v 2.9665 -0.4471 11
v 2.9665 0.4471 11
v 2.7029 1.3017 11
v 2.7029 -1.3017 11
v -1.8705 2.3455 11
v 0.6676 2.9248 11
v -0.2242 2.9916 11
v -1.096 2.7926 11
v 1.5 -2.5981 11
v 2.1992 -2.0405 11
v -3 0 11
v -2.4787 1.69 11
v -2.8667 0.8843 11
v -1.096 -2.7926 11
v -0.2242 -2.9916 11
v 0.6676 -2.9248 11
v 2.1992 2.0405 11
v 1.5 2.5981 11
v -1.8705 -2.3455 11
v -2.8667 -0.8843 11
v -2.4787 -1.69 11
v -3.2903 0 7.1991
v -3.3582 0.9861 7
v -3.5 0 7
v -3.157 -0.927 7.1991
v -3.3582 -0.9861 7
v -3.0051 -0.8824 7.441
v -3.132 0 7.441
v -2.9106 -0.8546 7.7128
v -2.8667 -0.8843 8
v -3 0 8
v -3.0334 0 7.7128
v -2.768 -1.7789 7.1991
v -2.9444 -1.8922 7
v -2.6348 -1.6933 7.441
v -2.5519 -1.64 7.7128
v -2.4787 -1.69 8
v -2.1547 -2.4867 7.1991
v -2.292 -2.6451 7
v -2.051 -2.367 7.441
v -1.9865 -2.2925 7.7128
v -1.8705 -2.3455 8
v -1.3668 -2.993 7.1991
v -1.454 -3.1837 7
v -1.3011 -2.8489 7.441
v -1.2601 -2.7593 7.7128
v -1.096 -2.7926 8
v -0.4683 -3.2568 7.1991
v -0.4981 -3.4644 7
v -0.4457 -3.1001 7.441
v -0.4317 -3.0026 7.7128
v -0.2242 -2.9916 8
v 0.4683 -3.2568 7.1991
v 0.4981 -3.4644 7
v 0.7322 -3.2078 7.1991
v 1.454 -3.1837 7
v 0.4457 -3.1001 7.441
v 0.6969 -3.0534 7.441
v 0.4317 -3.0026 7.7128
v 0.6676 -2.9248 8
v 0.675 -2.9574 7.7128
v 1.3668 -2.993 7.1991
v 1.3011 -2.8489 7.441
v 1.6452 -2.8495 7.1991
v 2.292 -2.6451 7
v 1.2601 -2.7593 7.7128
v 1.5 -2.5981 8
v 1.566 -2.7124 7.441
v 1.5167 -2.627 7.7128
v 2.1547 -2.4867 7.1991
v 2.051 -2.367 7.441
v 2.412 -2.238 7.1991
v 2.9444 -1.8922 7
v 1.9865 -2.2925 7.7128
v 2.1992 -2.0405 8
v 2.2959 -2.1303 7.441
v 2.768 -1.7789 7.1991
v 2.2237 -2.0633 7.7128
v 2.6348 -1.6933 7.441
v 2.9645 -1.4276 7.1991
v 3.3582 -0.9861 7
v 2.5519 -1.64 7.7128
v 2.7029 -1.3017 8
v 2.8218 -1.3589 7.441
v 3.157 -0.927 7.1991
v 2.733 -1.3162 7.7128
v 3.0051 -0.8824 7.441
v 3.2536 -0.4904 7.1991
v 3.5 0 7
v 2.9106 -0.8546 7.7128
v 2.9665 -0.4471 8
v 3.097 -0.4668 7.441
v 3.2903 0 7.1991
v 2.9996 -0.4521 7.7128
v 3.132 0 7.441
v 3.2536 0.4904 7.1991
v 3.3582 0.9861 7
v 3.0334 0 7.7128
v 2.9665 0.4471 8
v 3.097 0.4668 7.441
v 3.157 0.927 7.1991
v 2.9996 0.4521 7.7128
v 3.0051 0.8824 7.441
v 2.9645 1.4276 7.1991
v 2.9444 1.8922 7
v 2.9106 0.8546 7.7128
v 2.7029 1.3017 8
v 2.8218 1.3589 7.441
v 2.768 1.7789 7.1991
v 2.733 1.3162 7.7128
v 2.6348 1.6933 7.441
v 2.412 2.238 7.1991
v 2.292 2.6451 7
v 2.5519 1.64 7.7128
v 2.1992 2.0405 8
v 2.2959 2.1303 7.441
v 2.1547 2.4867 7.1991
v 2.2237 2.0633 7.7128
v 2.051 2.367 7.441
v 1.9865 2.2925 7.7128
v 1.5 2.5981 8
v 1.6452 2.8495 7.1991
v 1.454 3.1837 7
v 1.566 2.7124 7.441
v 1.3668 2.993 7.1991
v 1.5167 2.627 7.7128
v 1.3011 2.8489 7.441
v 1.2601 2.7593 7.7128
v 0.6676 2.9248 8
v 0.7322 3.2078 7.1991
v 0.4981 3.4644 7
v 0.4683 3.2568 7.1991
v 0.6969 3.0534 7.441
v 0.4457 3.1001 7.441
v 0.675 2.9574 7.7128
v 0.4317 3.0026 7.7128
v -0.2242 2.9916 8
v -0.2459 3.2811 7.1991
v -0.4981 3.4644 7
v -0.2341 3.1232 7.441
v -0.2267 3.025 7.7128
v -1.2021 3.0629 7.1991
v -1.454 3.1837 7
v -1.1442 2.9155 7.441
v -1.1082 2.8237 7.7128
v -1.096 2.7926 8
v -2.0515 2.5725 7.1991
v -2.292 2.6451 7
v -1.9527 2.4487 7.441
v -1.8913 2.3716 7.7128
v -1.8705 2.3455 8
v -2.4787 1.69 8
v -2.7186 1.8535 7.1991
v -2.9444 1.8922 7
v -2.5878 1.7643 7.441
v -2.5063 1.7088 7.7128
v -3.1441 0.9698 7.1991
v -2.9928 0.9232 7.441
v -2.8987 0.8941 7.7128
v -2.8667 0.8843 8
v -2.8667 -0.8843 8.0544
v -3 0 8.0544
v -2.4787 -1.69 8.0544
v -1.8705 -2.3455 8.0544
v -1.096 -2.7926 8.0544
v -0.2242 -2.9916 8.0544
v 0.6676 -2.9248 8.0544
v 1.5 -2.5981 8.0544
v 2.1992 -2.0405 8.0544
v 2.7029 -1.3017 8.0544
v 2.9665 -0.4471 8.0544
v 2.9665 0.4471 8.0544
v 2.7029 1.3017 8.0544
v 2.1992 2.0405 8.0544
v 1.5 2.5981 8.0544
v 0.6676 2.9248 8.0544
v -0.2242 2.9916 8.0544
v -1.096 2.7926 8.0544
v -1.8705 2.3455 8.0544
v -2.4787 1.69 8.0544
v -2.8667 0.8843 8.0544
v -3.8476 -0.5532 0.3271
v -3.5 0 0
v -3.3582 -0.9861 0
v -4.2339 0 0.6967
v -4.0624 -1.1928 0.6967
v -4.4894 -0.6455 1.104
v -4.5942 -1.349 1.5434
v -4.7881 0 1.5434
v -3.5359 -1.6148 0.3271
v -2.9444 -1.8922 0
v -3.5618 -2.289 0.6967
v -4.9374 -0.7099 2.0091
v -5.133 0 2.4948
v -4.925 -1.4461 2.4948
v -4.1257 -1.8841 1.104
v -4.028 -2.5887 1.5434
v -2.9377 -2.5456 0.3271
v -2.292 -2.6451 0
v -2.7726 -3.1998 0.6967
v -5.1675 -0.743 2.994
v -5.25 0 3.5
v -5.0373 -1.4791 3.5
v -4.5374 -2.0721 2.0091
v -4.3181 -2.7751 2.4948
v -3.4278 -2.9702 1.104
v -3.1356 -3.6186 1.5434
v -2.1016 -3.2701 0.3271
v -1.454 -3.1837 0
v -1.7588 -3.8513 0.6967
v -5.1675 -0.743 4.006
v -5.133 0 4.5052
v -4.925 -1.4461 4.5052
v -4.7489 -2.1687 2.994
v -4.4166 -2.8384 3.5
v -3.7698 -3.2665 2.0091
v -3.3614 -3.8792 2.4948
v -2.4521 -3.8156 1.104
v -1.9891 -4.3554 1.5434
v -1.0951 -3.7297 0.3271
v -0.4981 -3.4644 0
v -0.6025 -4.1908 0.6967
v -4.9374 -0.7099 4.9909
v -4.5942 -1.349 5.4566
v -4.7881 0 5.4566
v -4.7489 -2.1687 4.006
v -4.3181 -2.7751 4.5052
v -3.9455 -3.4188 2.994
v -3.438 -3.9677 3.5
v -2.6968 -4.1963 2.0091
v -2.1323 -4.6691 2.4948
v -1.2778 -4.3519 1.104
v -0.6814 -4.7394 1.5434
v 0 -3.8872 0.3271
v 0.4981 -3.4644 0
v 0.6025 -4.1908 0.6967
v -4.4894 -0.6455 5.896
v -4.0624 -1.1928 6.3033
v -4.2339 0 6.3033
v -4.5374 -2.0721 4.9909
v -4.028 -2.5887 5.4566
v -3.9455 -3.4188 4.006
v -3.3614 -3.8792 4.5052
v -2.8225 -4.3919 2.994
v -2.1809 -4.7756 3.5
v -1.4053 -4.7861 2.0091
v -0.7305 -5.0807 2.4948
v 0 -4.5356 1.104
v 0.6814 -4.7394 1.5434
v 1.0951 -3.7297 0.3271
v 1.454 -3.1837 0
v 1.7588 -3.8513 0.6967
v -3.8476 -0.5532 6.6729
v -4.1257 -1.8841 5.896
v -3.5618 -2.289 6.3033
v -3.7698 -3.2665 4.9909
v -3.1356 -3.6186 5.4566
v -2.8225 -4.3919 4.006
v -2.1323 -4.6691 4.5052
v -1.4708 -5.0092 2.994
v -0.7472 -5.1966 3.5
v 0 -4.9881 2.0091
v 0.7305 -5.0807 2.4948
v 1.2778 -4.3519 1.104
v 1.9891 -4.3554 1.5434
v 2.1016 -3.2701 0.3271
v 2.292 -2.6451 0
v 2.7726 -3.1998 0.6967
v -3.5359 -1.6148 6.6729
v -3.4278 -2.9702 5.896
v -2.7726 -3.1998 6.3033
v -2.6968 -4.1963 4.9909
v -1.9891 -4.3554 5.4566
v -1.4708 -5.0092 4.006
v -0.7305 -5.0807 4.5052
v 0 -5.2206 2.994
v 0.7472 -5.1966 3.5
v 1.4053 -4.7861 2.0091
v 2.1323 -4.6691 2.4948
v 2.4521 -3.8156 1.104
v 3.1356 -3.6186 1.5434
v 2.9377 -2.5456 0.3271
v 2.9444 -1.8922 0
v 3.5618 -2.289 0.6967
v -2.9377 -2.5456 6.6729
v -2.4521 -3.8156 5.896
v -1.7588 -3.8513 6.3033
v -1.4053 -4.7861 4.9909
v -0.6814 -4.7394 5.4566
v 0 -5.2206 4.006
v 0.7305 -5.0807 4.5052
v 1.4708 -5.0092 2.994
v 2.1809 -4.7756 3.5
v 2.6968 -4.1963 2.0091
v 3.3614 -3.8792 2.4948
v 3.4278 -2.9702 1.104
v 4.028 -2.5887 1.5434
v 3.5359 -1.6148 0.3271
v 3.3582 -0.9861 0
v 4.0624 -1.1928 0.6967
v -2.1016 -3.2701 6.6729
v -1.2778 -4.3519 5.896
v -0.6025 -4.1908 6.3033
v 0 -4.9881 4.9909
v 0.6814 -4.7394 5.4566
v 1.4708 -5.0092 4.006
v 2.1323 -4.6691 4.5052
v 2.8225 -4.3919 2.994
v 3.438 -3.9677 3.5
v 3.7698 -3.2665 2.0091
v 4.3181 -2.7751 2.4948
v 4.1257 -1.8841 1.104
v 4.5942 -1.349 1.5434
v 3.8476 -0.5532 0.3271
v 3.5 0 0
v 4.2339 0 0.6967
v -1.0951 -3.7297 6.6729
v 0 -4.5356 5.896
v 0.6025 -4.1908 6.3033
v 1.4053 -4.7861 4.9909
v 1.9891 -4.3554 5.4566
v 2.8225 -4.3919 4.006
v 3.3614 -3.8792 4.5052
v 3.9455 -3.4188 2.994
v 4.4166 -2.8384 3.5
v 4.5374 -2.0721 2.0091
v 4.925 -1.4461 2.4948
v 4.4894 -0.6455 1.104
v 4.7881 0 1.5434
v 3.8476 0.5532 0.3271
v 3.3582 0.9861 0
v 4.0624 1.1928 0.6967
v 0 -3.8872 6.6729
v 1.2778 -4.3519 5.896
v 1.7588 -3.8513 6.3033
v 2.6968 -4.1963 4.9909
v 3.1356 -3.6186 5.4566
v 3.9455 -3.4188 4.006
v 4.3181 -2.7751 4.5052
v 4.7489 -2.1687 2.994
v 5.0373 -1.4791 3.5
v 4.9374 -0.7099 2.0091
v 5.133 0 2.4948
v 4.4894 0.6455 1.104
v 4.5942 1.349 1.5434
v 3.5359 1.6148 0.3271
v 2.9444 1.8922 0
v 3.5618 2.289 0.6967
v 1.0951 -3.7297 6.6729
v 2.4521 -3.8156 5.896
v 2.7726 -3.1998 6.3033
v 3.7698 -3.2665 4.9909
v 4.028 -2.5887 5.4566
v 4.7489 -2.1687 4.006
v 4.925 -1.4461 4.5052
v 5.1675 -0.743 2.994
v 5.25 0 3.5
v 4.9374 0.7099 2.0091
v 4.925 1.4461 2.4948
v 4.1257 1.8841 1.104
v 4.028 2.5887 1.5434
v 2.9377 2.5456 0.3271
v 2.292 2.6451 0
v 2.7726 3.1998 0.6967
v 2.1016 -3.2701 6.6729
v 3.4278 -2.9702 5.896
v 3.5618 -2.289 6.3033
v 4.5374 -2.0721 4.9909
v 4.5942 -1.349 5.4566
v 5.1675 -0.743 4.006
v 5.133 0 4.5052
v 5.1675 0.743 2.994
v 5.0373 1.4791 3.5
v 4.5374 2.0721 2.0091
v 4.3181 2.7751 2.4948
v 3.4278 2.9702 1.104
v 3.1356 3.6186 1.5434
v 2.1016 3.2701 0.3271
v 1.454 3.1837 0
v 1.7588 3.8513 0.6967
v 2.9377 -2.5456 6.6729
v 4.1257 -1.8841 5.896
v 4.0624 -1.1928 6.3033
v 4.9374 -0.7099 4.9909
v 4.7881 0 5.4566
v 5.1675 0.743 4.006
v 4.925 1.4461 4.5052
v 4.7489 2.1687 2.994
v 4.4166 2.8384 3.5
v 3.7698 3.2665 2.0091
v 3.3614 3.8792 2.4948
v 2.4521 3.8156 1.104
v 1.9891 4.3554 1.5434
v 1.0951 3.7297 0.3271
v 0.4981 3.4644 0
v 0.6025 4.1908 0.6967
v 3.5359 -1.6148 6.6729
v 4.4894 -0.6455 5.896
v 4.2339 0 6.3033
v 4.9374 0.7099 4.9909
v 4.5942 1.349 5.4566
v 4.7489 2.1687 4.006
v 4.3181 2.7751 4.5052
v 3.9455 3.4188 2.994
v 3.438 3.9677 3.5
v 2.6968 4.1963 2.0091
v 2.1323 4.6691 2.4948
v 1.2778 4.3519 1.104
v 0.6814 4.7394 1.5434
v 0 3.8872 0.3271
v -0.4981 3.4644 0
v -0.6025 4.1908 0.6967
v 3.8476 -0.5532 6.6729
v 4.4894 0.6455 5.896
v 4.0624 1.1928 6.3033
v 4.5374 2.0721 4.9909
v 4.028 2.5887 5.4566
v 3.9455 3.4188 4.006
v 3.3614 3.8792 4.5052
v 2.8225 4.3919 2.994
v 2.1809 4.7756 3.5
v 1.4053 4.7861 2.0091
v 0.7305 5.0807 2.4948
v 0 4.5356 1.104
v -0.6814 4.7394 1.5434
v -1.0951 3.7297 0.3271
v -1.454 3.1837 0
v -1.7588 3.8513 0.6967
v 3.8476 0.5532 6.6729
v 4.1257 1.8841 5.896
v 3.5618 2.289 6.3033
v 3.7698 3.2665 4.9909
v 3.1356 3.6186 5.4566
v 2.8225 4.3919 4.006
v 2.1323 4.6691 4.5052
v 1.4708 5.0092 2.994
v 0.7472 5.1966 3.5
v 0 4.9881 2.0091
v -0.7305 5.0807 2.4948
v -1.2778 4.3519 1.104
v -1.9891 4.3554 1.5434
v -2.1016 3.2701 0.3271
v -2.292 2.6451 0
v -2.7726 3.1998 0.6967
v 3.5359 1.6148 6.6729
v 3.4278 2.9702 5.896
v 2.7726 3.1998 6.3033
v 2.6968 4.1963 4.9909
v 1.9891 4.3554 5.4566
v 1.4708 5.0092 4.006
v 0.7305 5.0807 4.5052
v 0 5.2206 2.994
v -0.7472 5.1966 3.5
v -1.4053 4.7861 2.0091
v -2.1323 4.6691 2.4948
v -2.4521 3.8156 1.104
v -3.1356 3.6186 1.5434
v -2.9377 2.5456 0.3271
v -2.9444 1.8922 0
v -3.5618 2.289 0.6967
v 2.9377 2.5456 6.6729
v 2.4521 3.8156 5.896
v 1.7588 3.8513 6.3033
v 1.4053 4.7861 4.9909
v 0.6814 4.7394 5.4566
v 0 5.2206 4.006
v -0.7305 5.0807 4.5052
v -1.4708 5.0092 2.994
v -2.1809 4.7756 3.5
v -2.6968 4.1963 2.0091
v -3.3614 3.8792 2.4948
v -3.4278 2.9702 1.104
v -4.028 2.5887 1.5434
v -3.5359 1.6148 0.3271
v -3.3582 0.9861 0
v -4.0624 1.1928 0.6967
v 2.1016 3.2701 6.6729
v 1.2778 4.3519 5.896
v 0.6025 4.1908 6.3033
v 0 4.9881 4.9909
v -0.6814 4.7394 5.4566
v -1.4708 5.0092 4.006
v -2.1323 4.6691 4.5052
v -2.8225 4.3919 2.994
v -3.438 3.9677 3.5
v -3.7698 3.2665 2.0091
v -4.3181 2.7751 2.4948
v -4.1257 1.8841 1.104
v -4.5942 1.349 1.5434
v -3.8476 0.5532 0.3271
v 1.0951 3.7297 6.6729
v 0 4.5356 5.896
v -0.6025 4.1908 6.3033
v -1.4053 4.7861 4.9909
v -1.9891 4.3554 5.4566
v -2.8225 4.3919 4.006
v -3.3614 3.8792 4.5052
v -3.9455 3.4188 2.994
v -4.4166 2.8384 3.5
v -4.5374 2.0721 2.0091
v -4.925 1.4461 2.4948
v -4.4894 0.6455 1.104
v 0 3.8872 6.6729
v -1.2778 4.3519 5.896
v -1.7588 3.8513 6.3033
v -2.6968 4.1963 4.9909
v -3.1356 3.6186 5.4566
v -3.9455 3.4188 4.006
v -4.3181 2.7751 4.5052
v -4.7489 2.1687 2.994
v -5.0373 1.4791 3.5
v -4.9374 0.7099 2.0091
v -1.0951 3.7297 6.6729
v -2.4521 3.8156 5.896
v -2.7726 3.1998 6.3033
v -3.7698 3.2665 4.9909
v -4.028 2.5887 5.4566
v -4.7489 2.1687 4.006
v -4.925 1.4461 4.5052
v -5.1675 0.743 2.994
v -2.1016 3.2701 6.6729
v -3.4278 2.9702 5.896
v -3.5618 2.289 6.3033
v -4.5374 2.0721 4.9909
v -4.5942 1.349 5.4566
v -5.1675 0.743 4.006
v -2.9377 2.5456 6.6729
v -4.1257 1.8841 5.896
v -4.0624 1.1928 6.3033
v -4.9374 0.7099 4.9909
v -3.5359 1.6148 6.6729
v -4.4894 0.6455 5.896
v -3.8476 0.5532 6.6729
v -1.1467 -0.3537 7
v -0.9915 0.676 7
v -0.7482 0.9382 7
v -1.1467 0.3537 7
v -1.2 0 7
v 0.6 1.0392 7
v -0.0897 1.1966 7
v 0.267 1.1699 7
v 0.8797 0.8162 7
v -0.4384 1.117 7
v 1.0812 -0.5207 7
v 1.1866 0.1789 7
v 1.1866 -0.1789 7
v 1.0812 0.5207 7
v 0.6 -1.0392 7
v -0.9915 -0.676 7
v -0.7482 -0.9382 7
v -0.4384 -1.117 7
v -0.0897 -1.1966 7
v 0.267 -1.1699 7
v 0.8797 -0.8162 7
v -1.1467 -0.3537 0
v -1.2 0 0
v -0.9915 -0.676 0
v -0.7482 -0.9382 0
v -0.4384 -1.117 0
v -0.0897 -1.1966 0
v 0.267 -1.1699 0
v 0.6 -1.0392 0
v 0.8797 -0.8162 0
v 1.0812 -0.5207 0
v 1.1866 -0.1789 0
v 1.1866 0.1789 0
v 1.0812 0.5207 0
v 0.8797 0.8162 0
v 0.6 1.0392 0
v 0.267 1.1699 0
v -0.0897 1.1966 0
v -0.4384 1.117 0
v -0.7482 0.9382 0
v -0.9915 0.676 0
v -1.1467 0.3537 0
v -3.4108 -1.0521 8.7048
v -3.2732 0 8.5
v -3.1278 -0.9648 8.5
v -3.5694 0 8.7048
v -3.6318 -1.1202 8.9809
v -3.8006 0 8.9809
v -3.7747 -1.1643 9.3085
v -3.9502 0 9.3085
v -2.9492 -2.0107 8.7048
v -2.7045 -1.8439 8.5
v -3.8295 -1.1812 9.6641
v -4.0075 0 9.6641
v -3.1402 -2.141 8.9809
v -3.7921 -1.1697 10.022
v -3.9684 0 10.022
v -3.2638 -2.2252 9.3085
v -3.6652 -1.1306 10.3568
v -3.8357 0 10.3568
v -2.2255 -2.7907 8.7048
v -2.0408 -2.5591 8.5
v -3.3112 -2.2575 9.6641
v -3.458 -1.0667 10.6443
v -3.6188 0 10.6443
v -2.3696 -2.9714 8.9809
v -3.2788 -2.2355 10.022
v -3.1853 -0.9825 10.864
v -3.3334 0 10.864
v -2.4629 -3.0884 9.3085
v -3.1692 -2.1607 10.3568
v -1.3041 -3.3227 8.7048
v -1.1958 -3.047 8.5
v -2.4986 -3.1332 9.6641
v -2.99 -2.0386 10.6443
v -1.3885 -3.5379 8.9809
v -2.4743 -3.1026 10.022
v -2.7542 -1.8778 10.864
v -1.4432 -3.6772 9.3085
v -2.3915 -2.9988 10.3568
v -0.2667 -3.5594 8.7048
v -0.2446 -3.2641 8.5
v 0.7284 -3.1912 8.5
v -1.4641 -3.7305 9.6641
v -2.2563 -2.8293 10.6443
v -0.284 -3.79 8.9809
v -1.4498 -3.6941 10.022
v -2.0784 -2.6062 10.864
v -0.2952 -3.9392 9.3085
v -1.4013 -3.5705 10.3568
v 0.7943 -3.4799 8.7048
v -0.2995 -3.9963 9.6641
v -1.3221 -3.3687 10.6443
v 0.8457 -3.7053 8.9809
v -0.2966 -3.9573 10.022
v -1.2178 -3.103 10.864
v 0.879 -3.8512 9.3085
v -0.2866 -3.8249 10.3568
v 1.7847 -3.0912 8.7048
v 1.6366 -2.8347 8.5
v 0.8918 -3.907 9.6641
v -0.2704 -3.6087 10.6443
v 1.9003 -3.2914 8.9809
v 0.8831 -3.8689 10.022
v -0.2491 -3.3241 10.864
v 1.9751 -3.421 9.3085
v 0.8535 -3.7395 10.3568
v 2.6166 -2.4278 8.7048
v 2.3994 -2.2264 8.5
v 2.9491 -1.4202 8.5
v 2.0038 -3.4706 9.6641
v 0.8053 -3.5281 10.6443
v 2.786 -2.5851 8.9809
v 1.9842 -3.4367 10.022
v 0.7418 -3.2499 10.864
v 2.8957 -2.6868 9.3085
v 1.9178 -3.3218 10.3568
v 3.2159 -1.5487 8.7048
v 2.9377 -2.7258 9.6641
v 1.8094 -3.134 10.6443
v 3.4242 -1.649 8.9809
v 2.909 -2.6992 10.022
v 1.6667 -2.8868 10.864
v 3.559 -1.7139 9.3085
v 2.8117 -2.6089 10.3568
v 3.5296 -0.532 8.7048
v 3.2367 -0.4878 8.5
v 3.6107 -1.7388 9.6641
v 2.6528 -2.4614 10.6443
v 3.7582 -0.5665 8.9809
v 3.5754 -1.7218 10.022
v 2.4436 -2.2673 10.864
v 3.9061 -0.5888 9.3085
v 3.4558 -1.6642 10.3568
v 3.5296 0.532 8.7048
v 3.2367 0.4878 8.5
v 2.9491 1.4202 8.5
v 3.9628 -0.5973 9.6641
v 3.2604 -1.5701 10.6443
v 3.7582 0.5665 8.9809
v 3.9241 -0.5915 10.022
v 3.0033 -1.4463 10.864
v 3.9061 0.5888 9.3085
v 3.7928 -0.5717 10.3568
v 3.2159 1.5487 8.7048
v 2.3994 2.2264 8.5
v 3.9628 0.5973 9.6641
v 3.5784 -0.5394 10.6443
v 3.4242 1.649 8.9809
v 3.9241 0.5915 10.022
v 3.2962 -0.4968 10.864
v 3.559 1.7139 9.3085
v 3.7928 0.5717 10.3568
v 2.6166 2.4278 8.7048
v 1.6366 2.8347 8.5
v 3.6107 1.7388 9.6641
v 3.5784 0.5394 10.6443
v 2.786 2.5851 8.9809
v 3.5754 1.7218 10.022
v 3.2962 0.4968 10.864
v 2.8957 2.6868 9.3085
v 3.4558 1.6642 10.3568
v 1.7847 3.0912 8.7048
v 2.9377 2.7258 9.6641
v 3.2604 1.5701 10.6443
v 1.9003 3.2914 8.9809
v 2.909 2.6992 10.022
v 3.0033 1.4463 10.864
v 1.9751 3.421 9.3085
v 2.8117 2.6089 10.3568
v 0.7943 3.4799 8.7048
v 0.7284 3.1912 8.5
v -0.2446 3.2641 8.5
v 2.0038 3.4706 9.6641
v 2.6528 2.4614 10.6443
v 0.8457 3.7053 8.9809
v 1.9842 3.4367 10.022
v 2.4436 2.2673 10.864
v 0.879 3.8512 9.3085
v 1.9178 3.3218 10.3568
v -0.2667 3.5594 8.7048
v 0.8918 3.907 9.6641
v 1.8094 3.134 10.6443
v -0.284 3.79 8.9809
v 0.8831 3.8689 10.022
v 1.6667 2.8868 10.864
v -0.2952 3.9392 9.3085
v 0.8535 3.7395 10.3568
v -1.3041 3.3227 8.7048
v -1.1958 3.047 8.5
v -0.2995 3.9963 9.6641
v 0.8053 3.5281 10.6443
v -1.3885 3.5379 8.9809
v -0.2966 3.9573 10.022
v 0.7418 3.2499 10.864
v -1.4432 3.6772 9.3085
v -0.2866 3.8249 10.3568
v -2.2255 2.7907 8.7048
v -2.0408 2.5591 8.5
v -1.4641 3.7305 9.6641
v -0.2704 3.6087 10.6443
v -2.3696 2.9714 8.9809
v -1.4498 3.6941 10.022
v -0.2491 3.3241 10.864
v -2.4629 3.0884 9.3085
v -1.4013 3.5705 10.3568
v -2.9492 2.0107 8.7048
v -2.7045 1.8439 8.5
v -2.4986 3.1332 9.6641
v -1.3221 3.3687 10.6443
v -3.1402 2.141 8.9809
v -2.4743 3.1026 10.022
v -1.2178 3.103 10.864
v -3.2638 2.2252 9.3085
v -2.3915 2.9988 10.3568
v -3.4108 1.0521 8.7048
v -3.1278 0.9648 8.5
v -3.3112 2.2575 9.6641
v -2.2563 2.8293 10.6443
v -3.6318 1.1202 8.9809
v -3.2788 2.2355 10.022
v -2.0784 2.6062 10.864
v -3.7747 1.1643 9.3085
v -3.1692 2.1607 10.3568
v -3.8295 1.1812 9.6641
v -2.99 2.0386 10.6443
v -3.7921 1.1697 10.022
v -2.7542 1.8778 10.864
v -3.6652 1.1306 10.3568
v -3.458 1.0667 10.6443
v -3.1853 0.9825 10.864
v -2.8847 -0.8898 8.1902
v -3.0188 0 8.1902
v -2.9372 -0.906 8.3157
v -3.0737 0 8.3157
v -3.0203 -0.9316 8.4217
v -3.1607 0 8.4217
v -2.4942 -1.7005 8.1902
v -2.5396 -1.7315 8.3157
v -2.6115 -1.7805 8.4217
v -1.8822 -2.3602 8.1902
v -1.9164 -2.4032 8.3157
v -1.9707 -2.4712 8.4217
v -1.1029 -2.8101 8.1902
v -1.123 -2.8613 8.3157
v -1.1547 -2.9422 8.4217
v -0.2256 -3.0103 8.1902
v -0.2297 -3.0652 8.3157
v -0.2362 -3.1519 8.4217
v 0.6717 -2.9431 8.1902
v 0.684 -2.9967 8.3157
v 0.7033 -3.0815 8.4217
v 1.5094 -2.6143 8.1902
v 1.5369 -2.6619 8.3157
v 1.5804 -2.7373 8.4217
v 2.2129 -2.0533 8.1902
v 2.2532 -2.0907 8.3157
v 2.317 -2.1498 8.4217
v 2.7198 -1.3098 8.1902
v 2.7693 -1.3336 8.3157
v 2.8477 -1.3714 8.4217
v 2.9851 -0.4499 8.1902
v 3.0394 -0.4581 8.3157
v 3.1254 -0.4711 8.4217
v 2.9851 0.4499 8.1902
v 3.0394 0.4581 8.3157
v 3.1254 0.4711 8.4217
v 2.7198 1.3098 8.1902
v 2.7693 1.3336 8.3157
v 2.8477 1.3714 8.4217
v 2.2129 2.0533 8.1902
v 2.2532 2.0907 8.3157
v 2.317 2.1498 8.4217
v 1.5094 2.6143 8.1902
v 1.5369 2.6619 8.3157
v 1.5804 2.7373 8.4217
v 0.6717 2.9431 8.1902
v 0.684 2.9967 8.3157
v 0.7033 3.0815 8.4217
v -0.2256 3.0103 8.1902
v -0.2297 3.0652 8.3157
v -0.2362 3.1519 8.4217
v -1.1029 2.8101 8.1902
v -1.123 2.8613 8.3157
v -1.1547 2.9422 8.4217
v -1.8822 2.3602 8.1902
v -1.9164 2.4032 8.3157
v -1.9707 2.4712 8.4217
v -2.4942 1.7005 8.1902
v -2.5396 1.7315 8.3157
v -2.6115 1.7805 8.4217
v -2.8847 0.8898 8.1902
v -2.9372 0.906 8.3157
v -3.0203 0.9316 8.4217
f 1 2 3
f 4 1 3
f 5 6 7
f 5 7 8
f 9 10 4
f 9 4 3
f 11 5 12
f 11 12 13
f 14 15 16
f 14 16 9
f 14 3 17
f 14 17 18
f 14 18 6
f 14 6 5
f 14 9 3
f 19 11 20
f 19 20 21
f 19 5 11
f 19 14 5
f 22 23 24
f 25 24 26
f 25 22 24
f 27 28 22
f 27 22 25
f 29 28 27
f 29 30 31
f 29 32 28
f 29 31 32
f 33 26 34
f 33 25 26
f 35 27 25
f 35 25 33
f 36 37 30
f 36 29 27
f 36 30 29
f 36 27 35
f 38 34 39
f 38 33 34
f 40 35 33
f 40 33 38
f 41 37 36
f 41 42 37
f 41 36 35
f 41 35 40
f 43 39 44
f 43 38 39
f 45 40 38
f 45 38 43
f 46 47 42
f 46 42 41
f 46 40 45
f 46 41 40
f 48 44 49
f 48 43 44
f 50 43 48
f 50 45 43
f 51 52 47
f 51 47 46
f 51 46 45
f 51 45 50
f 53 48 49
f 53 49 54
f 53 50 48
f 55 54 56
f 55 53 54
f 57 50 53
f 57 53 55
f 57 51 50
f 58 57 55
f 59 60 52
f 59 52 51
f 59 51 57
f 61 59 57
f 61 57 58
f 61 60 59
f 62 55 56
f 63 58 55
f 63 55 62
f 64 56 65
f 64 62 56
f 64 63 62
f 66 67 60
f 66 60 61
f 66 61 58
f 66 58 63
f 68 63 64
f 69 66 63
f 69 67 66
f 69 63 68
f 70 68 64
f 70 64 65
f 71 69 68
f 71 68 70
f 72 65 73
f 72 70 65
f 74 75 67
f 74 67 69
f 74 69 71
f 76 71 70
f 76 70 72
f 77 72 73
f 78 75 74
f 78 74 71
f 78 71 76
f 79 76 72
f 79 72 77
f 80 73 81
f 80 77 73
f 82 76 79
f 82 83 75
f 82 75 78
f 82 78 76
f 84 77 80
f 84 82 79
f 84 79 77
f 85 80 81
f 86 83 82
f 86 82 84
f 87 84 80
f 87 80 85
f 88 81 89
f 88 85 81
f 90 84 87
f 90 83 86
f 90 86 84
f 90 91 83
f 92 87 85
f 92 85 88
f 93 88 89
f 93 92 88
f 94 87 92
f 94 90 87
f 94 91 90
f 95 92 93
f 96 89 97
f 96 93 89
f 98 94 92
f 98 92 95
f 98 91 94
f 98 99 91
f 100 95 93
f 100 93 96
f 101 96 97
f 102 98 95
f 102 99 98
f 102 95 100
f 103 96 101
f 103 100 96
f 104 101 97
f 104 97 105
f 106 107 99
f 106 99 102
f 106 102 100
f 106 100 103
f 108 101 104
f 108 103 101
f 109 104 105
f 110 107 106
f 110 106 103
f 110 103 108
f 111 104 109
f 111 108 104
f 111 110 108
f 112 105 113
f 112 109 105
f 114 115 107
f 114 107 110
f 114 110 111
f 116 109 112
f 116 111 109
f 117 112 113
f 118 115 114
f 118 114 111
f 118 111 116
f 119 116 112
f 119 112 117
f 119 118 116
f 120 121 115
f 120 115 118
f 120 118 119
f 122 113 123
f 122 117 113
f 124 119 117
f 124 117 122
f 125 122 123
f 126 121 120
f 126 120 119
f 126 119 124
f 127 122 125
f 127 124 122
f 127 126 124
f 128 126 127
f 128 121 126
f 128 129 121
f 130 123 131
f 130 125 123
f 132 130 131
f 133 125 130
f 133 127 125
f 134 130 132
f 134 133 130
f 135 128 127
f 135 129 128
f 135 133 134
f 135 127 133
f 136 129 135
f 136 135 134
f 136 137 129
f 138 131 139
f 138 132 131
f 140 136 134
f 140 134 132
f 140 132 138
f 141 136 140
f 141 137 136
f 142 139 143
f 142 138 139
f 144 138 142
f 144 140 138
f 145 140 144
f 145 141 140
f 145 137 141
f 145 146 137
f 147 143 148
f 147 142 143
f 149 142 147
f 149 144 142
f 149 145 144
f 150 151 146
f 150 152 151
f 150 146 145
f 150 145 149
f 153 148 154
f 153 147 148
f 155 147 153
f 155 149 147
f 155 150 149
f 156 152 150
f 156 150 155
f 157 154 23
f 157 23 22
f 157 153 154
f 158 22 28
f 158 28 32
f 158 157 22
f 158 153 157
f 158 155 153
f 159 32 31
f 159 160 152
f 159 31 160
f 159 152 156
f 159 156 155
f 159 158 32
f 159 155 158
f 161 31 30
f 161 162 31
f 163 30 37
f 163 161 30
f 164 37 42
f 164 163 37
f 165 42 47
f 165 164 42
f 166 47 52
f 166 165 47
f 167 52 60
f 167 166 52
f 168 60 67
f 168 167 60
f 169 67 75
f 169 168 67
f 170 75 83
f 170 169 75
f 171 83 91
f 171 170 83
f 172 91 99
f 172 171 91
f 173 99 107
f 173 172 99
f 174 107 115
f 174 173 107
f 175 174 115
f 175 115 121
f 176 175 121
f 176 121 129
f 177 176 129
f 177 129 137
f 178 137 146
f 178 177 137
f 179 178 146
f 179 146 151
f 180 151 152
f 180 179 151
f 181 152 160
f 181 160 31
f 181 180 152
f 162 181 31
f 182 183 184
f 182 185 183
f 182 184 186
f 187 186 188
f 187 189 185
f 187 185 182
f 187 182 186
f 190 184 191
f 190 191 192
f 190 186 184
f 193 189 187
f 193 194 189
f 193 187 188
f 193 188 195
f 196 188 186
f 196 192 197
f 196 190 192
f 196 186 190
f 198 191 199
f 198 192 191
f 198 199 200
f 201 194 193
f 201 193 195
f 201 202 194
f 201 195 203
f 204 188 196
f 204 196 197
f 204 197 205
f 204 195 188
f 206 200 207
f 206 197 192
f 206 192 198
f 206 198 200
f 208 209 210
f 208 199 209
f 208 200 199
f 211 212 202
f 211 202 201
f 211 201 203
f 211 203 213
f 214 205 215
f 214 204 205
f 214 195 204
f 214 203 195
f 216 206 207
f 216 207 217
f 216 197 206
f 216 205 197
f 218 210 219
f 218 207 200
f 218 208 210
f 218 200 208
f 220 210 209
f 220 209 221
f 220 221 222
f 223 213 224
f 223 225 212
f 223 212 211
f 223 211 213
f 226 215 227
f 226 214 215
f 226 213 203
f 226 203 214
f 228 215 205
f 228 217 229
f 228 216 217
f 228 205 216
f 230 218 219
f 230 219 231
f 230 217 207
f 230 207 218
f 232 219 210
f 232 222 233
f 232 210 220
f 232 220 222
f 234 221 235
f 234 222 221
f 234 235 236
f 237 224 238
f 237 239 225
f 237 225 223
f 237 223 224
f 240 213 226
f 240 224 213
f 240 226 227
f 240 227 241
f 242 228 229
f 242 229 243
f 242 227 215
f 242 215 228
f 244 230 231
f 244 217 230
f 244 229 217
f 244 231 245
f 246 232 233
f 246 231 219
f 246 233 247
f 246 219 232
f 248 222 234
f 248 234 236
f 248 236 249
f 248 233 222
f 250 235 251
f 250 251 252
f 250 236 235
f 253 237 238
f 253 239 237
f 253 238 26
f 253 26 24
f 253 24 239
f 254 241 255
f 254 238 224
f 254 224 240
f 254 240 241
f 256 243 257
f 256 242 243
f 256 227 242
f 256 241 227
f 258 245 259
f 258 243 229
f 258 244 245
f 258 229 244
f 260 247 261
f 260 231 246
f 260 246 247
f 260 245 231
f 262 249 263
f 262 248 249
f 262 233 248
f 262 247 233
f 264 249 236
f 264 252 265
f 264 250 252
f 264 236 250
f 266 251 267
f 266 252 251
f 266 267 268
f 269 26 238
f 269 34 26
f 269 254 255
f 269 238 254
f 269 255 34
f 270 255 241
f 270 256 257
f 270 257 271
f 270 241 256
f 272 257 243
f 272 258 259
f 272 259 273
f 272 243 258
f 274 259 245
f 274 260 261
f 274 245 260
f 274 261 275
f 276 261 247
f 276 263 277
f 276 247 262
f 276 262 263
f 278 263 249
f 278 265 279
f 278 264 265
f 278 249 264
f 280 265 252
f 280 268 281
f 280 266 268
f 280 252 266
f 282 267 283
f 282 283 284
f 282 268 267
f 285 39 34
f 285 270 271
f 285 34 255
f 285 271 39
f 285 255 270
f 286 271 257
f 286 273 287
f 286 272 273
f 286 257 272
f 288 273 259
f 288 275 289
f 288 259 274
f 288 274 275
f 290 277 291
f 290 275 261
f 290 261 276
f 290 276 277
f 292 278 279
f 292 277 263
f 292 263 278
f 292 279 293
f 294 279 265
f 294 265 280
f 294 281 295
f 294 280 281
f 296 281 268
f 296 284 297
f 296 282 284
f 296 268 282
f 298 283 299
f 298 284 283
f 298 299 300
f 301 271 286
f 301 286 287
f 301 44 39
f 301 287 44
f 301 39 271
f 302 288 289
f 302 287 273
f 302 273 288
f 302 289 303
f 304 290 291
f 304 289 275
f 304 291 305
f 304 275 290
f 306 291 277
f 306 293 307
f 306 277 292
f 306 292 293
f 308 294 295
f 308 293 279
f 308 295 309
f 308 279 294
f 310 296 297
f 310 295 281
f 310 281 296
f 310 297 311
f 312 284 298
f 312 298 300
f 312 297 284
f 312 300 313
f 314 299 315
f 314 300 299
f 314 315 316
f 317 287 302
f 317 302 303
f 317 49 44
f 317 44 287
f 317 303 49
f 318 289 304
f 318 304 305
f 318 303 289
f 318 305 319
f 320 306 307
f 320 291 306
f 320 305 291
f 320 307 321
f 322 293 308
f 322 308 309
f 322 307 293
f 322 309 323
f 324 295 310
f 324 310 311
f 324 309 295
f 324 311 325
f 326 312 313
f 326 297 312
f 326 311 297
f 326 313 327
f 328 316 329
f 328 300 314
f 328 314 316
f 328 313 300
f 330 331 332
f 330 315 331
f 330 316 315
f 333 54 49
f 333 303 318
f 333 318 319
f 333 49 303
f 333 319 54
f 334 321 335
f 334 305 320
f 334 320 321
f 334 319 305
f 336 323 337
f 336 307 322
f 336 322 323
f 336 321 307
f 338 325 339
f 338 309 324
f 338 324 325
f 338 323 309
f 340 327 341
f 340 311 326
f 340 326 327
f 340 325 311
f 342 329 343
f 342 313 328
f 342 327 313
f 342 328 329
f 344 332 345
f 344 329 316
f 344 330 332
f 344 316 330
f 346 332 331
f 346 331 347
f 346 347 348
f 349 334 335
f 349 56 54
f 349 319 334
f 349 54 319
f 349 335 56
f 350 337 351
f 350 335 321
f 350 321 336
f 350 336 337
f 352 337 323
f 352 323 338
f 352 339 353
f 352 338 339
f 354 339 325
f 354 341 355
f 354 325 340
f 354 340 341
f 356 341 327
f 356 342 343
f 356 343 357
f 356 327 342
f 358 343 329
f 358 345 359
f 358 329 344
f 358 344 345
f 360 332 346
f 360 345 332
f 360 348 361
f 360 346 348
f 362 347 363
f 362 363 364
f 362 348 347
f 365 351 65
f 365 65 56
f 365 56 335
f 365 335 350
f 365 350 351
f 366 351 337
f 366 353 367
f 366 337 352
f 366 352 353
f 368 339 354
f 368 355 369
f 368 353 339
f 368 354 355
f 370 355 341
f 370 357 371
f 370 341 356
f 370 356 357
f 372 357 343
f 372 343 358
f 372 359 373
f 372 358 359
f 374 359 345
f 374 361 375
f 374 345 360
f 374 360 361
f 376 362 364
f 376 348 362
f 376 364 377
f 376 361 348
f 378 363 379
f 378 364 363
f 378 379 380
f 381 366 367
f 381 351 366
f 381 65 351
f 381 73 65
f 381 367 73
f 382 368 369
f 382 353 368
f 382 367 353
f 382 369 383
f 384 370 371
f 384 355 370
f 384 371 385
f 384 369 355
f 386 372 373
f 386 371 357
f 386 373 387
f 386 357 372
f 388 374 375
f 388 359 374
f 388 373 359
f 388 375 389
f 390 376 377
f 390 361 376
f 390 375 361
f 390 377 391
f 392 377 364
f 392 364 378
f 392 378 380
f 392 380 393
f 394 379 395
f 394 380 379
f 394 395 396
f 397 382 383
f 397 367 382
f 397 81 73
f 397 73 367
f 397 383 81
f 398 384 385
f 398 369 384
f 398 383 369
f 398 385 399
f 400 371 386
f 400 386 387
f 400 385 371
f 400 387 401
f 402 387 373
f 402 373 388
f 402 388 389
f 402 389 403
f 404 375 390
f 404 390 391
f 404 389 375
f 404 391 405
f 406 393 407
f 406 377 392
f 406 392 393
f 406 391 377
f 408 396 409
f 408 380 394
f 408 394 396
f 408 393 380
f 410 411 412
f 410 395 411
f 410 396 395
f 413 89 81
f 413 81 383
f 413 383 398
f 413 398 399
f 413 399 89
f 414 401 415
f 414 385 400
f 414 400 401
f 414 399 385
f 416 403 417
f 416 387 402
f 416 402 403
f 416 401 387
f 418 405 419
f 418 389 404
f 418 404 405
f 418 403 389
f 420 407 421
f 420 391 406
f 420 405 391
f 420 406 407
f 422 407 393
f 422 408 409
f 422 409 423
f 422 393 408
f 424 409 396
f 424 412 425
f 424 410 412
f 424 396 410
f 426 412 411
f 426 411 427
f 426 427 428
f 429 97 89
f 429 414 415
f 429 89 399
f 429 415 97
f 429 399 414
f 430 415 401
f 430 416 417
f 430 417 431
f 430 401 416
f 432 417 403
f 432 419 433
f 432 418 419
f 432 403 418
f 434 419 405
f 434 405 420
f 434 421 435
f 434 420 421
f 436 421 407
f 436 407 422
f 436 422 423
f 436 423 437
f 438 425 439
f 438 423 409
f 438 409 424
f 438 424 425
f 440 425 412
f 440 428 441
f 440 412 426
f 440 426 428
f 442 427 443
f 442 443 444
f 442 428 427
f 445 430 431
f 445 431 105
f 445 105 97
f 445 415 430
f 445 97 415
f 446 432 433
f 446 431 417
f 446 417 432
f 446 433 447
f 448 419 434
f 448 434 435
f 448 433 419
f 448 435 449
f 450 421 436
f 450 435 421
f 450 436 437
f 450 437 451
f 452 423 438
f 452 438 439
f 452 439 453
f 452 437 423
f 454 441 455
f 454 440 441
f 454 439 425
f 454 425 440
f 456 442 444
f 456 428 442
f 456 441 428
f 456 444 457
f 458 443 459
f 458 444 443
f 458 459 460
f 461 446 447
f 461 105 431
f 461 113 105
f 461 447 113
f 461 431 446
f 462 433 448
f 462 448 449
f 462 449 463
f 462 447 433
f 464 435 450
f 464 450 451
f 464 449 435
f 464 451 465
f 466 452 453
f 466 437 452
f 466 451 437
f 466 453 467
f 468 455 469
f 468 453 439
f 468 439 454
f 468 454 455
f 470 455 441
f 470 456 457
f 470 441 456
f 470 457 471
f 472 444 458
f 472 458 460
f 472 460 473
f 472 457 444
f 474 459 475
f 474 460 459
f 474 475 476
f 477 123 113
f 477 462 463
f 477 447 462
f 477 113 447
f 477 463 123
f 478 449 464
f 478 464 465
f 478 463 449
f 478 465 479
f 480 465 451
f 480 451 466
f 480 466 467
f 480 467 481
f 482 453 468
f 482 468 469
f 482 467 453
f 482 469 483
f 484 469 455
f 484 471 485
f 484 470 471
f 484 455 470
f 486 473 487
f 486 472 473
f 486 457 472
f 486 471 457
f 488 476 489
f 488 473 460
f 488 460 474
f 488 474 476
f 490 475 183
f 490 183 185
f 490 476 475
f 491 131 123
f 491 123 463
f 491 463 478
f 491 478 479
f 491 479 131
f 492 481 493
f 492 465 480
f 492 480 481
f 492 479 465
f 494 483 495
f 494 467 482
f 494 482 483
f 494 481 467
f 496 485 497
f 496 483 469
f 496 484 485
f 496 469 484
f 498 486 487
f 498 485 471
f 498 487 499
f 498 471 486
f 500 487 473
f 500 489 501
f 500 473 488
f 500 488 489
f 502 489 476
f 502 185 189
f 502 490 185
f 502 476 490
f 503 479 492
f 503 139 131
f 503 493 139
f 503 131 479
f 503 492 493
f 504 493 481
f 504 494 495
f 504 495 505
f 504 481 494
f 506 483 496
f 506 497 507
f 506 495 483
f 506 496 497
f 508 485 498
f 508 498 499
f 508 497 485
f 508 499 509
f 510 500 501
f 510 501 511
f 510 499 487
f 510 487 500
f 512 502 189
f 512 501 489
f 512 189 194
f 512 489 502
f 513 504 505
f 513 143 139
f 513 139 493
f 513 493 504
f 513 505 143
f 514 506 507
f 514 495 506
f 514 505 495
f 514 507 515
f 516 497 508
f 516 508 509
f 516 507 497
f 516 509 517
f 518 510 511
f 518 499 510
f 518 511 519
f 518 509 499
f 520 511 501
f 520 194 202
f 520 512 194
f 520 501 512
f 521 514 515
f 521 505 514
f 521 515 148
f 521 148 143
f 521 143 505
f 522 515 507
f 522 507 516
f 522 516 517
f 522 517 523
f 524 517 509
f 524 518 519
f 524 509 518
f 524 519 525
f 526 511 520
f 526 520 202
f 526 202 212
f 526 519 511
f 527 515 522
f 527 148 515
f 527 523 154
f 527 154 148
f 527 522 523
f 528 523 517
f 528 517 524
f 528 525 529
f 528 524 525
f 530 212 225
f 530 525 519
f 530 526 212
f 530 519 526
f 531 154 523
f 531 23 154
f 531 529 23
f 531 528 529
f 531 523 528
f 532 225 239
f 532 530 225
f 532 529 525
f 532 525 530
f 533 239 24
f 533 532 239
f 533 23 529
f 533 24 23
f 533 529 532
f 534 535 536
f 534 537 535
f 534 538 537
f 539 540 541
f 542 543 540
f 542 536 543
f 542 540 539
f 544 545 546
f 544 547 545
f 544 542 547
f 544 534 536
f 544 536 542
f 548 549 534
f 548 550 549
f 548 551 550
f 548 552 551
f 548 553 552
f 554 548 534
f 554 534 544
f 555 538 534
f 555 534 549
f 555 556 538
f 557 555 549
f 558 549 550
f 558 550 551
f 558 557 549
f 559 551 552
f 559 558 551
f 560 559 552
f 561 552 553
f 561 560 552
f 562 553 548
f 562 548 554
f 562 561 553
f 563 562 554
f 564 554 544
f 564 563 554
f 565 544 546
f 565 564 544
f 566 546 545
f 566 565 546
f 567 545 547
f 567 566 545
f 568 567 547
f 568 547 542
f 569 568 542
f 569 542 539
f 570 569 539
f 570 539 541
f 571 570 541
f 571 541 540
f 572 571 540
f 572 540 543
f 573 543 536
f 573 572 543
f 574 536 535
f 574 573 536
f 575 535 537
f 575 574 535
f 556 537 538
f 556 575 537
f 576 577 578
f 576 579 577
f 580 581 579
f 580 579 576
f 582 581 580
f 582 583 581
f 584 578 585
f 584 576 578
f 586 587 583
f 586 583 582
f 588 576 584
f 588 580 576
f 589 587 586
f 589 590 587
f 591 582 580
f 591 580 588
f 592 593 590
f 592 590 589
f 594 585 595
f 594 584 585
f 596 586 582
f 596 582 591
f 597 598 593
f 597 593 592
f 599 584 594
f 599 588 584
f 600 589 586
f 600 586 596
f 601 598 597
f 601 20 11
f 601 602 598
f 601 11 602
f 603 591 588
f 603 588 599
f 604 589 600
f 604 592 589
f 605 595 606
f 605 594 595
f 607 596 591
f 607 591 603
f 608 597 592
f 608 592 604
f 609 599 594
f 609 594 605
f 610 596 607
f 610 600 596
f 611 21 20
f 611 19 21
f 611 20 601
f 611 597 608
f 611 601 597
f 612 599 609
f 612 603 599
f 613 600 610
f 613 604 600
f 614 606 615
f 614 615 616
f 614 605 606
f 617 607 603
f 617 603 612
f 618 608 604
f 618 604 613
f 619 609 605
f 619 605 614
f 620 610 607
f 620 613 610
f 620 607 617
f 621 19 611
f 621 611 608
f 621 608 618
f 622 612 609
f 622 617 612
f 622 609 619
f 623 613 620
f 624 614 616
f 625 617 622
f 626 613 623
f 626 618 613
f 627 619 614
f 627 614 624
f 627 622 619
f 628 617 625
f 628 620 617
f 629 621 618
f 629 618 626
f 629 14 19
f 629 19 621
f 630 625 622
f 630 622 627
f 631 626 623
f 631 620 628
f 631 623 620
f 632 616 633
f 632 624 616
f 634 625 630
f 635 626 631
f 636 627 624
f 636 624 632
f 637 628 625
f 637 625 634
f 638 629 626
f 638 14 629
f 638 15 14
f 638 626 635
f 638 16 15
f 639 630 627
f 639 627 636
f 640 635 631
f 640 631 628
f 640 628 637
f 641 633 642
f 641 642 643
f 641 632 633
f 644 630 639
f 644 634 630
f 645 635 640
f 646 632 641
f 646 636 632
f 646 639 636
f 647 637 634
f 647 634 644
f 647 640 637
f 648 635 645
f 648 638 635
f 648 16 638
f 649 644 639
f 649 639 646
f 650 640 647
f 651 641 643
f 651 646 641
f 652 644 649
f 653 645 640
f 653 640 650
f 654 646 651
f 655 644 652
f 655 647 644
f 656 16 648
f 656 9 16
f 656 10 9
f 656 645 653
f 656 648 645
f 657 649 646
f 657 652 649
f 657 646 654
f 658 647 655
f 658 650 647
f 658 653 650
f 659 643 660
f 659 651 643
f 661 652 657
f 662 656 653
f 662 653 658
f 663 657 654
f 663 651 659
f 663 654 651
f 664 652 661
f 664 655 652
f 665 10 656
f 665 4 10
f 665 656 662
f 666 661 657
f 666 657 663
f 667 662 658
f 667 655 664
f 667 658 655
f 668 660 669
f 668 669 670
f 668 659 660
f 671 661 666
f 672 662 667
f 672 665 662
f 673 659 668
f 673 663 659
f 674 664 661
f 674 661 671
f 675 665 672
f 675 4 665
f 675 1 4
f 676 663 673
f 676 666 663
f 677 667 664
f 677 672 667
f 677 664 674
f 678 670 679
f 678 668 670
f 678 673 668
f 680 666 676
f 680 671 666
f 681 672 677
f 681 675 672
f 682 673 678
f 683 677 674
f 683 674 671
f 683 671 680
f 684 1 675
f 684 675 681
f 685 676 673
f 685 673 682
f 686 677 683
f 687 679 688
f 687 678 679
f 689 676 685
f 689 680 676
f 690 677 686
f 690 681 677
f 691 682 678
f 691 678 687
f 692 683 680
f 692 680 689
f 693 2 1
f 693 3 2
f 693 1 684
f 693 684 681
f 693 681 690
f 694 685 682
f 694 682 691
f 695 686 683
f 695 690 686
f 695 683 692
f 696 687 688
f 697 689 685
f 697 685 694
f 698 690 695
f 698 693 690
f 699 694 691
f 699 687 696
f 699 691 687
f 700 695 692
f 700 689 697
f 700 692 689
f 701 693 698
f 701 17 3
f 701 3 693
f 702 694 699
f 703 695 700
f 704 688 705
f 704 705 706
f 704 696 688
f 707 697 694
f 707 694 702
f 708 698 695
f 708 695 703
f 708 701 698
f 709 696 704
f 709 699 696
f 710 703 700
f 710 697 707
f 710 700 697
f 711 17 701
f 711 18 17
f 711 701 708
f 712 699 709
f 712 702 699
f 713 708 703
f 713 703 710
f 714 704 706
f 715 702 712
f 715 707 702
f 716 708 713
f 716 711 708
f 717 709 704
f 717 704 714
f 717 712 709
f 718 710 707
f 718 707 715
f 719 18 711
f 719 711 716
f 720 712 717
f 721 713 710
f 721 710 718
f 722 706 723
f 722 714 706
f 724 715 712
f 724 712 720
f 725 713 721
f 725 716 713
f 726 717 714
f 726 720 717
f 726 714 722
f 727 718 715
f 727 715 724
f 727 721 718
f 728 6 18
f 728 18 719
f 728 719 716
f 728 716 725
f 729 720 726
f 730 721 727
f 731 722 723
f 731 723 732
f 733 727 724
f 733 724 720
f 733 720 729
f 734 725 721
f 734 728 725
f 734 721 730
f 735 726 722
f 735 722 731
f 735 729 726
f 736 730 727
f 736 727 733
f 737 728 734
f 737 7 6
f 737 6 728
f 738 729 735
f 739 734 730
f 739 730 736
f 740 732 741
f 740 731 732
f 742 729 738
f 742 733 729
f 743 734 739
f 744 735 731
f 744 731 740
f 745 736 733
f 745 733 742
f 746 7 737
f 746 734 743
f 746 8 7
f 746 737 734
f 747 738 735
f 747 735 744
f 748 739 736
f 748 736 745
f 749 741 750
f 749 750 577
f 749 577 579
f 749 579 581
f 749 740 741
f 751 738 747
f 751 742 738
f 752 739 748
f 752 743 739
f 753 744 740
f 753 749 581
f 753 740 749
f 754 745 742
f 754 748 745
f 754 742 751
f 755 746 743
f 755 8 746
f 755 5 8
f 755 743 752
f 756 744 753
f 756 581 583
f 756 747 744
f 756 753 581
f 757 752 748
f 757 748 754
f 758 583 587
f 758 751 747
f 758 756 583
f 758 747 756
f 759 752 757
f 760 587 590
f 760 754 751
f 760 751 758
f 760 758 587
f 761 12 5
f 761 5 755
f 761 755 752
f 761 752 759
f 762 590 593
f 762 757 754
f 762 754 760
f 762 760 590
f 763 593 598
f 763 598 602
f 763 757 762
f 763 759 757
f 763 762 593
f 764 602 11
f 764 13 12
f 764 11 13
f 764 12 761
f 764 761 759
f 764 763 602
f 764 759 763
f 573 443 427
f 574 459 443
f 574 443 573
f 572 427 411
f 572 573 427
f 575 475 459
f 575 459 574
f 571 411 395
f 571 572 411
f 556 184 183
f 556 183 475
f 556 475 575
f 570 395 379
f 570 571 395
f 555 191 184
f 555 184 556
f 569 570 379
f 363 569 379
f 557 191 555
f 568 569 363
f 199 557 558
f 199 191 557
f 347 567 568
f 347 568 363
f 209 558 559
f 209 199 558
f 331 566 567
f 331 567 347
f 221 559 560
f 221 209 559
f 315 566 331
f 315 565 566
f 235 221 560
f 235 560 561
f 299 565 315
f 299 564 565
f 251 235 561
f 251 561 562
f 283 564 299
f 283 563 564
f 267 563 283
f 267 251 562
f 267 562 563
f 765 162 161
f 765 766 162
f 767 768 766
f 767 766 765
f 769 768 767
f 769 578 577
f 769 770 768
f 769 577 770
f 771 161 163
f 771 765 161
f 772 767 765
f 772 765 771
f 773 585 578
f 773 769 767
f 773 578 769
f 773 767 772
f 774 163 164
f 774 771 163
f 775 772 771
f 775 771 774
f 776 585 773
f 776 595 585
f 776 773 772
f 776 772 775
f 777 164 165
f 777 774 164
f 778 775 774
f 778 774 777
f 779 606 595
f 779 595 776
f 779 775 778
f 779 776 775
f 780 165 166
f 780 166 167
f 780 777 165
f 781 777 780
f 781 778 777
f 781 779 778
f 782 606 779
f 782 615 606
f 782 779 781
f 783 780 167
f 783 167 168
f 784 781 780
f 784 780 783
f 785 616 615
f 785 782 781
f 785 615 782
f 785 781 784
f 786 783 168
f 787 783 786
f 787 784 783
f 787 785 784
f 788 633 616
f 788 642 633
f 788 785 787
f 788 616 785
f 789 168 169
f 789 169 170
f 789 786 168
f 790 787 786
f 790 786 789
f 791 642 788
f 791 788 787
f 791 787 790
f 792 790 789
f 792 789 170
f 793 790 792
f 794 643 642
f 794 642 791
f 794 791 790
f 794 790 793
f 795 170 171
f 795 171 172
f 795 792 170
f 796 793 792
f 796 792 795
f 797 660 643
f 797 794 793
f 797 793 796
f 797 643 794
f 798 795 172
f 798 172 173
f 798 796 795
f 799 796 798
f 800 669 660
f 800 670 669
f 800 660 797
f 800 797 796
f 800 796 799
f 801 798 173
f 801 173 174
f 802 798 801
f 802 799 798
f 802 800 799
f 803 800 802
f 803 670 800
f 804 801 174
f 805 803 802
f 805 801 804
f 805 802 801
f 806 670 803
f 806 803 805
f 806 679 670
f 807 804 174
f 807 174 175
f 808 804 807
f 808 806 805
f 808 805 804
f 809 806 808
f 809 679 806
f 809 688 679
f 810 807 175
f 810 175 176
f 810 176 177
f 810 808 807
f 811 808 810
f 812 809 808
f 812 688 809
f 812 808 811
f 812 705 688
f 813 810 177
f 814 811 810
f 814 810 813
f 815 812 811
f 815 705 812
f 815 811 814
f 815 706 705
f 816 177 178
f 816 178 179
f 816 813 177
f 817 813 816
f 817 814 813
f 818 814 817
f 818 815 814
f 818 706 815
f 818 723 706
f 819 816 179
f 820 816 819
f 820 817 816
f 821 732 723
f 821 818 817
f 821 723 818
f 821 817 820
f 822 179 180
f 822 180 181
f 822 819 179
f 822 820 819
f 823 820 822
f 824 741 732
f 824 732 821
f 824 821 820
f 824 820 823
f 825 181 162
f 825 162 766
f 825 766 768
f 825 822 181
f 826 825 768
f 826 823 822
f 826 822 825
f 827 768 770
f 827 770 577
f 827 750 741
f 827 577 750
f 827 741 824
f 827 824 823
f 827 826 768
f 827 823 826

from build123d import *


with BuildPart() as part:
    # Эскиз1 → Повернуть2 (revolve)
    with BuildSketch(Plane(origin=(0, 0, 0), x_dir=(1, 0, 0), z_dir=(0, 1, 0))):
        with BuildLine():
            Line((-3, -8), (-3, -8.054381717))
            ThreePointArc((-3, -8.054381717), (-3.073746154, -8.315739055), (-3.273230633, -8.5))
            ThreePointArc((-3.273230633, -8.5), (-4, -9.844361258), (-3, -11))
            Line((-3, -11), (0, -11))
            Line((0, -11), (0, -7))
            Line((0, -7), (-1.2, -7))
            Line((-1.2, -7), (-1.2, 0))
            Line((-1.2, 0), (-3.5, 0))
            ThreePointArc((-3.5, 0), (-5.25, -3.5), (-3.5, -7))
            ThreePointArc((-3.5, -7), (-3.131966011, -7.440983006), (-3, -8))
        make_face()
    revolve(axis=Axis((0, 0, 0), (0, 0, 1)))


solid = part.part
